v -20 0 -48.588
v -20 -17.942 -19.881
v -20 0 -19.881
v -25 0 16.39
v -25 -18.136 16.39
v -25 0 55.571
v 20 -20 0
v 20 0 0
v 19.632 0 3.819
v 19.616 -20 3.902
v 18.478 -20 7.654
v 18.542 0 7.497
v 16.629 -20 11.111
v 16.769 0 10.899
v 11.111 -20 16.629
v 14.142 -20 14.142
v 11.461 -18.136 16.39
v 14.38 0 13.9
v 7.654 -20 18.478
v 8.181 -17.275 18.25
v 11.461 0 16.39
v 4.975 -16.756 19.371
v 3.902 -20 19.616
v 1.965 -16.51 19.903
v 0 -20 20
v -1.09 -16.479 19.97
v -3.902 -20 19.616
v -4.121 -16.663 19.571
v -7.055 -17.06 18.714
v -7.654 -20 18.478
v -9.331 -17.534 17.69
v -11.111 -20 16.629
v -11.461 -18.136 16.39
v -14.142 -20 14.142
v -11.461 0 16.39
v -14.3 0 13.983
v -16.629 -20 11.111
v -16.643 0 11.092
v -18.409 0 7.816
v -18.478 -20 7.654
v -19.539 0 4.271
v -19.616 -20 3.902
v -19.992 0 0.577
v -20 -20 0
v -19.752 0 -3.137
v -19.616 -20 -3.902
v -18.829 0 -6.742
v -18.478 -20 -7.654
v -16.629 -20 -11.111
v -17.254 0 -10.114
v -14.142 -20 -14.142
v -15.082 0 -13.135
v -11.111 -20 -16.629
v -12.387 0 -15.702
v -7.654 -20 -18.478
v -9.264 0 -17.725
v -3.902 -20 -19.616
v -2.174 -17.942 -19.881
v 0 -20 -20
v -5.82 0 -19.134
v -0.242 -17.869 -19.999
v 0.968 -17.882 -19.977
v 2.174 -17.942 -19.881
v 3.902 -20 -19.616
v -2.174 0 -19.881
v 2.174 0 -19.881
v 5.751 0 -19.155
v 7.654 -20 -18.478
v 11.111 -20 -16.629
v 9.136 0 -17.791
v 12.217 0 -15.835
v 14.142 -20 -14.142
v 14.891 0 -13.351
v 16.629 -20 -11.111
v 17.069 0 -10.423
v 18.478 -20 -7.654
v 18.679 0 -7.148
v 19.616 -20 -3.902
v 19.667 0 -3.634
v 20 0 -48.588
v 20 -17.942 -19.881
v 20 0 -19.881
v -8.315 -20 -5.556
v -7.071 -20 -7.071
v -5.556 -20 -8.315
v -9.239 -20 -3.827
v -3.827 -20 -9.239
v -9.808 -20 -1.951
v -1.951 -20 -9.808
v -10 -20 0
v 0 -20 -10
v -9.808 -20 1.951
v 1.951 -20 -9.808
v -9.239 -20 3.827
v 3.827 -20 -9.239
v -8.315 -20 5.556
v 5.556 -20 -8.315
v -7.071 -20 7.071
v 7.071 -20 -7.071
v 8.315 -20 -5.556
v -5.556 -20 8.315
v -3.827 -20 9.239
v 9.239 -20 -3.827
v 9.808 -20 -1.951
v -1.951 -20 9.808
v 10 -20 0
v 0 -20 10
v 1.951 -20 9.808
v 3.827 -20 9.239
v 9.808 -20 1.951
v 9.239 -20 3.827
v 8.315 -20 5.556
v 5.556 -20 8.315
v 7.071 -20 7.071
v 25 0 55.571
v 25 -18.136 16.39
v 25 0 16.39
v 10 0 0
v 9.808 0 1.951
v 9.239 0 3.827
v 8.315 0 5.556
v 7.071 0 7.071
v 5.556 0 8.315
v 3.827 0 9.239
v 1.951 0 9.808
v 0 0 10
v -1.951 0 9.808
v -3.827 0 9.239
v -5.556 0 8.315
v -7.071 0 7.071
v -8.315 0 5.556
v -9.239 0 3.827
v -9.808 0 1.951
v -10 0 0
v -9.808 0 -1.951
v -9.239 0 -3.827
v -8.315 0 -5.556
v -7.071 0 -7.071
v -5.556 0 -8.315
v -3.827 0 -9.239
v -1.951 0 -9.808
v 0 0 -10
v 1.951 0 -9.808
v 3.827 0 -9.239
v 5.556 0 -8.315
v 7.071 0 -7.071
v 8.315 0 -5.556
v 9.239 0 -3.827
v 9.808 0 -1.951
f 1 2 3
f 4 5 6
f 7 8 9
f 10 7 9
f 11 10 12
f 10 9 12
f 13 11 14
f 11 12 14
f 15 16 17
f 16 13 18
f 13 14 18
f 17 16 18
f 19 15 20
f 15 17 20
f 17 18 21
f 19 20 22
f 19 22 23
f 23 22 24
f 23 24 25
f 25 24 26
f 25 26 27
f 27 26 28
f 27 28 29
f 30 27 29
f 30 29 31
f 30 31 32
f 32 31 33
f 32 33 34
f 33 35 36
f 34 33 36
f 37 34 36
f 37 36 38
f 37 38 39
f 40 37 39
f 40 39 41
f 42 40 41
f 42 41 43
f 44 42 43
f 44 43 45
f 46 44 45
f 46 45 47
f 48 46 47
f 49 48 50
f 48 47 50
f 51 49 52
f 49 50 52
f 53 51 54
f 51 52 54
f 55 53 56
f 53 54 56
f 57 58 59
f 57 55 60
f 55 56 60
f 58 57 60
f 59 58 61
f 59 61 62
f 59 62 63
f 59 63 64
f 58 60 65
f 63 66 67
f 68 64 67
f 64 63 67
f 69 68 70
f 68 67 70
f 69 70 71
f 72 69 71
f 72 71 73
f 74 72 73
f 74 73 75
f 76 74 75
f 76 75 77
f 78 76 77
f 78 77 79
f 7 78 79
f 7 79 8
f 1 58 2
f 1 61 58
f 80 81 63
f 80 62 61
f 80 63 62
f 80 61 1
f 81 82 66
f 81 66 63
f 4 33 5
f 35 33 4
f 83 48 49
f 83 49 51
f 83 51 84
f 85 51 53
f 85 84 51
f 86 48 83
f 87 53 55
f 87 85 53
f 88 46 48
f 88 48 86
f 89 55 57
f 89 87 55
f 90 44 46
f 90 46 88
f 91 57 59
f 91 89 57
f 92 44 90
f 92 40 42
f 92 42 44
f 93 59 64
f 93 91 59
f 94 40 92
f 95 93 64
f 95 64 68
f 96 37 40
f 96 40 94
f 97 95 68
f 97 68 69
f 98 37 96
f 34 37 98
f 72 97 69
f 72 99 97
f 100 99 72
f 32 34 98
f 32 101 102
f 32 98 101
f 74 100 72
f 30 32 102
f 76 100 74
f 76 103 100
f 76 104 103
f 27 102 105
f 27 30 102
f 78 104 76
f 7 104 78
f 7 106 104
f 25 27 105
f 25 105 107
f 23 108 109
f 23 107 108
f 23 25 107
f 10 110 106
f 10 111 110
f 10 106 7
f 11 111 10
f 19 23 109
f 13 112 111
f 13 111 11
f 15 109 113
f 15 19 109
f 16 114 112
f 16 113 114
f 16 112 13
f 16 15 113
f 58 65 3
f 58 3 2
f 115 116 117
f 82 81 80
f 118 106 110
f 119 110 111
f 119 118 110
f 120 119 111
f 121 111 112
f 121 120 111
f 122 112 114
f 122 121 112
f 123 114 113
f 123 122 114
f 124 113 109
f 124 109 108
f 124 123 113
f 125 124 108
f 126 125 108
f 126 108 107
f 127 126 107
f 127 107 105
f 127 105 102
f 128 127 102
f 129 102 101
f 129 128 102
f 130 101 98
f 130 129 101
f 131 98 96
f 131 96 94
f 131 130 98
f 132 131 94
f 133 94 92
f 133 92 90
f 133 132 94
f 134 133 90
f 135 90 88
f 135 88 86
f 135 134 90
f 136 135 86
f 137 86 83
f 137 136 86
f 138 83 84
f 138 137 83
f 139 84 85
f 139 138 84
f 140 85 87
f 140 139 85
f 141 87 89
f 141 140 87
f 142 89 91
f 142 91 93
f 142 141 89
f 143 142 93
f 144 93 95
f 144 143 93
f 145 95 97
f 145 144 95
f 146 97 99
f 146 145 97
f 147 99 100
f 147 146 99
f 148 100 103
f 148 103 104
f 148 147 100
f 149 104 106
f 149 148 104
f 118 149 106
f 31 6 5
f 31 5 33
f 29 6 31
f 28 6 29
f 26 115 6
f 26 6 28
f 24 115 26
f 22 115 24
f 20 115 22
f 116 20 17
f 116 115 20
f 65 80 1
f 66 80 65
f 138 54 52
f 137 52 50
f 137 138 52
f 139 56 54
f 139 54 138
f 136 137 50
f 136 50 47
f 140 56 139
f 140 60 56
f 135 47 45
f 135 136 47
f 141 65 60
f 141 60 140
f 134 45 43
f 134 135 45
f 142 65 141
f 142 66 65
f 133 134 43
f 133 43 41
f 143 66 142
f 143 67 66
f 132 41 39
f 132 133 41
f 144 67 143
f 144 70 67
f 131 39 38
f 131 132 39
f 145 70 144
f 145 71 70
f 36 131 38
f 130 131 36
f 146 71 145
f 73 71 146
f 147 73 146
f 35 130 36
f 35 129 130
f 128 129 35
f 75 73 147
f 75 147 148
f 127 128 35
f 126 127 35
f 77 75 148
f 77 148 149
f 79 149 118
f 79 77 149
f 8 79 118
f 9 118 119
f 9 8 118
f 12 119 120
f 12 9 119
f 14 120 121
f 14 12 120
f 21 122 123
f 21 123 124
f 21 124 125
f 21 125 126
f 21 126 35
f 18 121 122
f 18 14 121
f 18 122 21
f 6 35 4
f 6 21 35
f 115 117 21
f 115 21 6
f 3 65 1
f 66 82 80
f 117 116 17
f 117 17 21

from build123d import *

# Parameters (mm, degrees)
F0_R     = 20
F0_R_2   = 10
F1_DEPTH = 20
F3_DEPTH = 25
F5_DEPTH = 20


with BuildPart() as f1:
    # F0 (on Front) → F1 (new body)
    with BuildSketch(Plane.XZ):
        Circle(F0_R)
        Circle(F0_R_2, mode=Mode.SUBTRACT)
    extrude(amount=F1_DEPTH)

    # F2 (on Right) → F3 (join, symmetric)
    with BuildSketch(Plane.YZ):
        Polygon((0, 16.390087), (0, 55.571124), (-18.135777, 16.390087), align=None)
    extrude(amount=F3_DEPTH, both=True)

    # F4 (on Right) → F5 (join, symmetric)
    with BuildSketch(Plane.YZ):
        Polygon((-17.94181, -19.881465), (0, -48.588365), (0, -19.881465), align=None)
    extrude(amount=F5_DEPTH, both=True)


solid = f1.part
